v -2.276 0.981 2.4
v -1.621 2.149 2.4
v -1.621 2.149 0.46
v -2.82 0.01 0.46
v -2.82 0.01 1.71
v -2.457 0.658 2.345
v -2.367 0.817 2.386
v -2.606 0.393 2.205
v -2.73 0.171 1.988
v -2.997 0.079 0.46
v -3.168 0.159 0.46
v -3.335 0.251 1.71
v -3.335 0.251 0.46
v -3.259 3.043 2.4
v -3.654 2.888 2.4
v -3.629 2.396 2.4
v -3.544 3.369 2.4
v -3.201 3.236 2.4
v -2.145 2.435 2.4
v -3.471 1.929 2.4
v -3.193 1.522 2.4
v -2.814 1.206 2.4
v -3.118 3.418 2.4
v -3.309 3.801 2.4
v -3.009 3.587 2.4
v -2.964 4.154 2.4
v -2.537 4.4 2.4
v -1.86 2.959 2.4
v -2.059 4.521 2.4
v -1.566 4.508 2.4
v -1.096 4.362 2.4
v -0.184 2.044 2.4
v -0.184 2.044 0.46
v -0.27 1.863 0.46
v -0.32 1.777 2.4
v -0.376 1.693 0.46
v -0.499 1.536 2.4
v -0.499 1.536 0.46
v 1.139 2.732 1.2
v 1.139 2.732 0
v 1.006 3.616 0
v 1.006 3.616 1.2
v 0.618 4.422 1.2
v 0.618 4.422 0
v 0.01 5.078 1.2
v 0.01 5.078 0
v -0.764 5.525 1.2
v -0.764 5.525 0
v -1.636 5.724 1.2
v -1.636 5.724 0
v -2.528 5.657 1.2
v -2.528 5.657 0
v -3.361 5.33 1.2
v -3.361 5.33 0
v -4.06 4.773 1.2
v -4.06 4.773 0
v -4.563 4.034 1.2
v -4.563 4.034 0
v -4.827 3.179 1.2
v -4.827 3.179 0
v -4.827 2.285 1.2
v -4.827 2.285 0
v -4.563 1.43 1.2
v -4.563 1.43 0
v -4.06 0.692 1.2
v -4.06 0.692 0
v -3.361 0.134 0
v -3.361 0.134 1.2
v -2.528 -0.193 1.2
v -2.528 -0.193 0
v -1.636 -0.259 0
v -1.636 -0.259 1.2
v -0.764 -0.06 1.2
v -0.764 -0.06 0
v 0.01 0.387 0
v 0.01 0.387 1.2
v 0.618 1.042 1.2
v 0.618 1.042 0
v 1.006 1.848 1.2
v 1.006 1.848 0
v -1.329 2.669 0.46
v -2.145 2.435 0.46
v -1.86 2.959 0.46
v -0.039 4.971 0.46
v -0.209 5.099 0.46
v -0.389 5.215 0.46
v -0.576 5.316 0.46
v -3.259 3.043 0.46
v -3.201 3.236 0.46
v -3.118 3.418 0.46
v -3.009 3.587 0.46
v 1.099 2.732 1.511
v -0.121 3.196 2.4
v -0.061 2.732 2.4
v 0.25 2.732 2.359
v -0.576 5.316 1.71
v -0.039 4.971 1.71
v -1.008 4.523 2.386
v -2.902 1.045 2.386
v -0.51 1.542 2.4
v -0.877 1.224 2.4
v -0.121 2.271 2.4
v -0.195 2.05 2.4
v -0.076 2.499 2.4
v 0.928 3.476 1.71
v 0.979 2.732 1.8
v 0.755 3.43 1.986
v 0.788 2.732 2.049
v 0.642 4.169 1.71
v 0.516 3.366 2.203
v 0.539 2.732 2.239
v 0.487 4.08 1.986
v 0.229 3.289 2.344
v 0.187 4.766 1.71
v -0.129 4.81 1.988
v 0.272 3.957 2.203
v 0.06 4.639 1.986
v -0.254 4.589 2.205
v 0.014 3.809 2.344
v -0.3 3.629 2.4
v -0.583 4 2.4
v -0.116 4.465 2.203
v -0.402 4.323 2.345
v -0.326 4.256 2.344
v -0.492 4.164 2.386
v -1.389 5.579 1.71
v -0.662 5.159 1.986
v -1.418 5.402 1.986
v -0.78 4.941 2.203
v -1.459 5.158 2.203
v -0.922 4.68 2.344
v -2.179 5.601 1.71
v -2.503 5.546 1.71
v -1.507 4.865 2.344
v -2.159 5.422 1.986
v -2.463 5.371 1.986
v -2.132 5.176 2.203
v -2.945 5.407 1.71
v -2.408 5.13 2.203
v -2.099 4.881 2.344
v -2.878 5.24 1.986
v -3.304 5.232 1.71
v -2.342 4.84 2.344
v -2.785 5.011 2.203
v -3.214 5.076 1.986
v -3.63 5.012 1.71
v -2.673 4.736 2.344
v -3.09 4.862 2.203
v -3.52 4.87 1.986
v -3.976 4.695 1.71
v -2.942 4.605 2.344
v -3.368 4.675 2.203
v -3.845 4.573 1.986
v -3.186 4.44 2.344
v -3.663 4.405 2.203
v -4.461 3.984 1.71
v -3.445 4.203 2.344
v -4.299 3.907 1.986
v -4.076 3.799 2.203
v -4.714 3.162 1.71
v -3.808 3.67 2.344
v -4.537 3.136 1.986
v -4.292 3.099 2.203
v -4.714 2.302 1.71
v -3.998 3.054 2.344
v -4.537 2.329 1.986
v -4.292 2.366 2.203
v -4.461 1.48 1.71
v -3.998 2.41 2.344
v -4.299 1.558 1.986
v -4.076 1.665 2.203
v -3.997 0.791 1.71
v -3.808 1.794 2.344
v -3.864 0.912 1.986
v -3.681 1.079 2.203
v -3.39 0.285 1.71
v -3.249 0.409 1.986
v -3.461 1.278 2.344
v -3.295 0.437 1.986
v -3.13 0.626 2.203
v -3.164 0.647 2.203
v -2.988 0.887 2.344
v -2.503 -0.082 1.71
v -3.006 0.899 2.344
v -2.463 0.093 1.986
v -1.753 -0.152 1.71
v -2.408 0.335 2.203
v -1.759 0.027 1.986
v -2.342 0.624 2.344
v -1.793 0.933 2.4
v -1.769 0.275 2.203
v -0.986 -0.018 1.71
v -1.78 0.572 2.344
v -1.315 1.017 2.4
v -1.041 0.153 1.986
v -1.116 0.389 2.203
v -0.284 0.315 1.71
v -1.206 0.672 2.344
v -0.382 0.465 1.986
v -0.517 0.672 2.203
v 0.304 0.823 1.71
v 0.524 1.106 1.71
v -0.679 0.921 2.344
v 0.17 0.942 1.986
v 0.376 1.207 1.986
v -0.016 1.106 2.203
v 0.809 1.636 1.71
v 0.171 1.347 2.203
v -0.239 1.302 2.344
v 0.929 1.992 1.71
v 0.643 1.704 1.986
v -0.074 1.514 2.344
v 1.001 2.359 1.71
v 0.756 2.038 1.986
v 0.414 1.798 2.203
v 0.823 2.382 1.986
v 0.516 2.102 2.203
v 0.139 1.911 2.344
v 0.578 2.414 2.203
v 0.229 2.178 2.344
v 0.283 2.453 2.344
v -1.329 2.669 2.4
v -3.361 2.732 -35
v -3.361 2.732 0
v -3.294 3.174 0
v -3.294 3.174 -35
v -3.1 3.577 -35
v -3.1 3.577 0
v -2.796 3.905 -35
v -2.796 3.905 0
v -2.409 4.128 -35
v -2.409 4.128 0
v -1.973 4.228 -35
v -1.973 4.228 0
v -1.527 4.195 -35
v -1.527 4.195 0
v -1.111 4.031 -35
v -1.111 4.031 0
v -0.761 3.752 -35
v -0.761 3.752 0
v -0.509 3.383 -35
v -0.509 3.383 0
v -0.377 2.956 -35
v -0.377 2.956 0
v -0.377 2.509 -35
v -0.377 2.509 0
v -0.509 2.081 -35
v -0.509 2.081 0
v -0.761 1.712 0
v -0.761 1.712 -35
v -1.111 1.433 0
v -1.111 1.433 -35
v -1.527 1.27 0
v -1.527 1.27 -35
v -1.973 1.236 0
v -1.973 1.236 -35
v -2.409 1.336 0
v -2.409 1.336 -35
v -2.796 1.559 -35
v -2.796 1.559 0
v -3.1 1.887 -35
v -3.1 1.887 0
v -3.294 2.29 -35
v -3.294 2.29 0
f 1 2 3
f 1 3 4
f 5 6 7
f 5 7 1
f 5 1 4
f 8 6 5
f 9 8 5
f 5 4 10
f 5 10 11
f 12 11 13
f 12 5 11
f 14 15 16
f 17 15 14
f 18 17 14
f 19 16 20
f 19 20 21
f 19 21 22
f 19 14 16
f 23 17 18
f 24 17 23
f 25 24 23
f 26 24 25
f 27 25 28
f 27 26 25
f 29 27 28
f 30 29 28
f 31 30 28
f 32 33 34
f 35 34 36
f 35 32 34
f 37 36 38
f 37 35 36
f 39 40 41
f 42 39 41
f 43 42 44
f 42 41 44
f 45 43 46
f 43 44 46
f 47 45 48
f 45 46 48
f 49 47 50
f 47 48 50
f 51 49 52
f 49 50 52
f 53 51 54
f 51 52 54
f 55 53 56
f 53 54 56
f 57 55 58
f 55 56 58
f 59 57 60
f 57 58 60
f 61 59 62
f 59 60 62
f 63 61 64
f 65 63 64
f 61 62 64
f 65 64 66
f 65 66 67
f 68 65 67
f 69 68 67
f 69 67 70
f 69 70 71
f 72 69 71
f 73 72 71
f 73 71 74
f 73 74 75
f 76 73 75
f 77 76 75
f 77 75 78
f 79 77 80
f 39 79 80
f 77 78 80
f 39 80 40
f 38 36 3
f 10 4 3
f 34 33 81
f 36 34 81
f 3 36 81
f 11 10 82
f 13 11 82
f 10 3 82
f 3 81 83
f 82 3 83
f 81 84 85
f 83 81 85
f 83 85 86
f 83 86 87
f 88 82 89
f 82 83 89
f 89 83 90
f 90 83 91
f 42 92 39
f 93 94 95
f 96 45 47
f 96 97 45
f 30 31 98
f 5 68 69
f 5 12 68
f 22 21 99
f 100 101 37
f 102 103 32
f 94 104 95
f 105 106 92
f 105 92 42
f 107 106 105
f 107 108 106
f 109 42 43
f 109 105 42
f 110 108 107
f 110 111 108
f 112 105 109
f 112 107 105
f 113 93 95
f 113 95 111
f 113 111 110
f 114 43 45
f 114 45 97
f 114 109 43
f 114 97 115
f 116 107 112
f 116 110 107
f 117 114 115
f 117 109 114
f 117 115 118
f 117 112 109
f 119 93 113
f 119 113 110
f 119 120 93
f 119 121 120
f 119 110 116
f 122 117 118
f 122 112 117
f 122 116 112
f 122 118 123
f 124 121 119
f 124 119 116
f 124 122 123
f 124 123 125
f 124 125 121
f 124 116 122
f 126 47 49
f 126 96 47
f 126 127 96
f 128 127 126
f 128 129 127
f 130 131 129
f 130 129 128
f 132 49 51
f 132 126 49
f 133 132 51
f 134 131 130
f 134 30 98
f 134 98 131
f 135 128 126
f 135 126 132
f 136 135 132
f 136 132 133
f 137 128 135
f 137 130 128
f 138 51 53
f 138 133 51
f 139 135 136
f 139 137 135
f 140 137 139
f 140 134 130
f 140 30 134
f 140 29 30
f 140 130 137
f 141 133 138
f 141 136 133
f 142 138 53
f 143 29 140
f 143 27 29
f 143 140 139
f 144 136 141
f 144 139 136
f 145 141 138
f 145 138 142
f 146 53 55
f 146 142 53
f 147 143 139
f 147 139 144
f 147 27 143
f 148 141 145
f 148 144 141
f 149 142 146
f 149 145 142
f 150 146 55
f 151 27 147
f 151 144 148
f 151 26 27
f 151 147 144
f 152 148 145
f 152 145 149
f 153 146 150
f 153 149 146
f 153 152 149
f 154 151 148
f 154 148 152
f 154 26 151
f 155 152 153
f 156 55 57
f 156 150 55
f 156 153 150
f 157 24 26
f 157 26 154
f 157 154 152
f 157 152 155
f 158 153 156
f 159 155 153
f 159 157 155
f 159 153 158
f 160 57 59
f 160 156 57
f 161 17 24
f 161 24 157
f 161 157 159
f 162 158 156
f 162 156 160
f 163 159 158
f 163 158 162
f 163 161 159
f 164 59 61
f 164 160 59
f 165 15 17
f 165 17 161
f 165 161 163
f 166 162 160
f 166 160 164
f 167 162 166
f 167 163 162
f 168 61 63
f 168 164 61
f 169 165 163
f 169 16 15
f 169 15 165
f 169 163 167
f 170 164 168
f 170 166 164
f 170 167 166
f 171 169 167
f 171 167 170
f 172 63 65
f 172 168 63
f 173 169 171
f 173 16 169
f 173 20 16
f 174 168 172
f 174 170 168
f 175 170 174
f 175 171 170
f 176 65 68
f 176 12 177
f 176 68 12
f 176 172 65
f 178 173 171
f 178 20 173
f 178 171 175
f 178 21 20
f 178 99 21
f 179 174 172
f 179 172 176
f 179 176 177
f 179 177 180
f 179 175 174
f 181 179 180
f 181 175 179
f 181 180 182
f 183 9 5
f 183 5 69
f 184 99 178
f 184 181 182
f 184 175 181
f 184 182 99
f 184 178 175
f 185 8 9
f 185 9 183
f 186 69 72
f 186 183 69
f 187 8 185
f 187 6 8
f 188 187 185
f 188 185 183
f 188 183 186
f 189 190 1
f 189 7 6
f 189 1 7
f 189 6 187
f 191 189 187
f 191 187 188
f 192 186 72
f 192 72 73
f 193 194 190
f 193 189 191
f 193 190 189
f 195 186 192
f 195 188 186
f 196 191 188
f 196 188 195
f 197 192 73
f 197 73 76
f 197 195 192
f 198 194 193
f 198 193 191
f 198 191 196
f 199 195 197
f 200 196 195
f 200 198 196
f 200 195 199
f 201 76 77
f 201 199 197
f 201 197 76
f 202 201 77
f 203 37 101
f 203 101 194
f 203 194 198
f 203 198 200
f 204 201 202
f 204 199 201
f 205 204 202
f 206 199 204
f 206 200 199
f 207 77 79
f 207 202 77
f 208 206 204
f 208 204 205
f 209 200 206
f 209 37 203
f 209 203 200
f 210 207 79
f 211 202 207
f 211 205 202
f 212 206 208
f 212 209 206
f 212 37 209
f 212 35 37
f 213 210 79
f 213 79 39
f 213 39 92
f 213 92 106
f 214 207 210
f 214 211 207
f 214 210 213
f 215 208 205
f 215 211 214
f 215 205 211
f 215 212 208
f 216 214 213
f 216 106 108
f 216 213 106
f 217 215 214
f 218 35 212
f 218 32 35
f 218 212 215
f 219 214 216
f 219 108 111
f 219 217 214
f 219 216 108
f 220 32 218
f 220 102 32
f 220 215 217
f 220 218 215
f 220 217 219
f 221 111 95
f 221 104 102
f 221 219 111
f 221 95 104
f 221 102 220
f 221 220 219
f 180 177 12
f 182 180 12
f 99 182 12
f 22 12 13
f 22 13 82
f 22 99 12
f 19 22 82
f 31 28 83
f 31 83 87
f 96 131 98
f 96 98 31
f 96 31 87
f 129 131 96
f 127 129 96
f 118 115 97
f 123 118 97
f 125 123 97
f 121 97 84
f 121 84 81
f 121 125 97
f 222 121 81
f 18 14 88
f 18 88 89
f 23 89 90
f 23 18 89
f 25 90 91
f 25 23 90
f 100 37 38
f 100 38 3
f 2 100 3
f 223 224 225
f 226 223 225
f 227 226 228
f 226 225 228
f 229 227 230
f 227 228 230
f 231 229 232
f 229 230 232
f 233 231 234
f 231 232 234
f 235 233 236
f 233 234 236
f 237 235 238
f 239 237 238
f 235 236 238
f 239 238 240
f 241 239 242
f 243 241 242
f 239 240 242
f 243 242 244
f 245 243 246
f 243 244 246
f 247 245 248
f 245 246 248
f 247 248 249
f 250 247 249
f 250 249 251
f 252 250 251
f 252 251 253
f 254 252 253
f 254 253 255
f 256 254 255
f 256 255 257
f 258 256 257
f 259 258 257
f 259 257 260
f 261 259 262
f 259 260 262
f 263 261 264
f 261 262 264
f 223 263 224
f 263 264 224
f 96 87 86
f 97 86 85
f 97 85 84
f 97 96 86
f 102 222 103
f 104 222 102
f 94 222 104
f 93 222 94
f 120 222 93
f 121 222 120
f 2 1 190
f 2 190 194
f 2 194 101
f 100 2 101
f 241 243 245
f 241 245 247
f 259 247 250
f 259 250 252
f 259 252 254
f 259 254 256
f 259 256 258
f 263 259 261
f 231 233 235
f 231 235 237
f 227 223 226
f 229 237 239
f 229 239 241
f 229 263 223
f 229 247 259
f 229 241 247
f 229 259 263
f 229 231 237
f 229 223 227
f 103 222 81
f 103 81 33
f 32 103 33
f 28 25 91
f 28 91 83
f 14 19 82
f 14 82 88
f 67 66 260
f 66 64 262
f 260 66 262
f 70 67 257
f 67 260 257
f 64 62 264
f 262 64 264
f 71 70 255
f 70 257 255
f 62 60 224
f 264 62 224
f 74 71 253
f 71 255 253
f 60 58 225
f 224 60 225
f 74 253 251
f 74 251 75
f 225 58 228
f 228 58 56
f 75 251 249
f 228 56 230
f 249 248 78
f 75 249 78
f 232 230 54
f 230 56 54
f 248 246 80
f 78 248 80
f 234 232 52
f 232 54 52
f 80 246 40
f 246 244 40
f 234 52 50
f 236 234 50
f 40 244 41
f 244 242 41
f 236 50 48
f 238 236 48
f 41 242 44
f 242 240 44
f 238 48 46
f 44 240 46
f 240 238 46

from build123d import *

# Parameters (mm, degrees)
SZKIC1_R                    = 3
DODANIE_WYCI_GNI_CIE2_DEPTH = 2.4
SZKIC2_R                    = 1.5
DODANIE_WYCI_GNI_CIE3_DEPTH = 35
ZAOKR_GLENIE2_R             = 1.2
WYTNIJ_WYCI_GNI_CIE1_DEPTH  = 1.94


with BuildPart() as part:
    # Szkic1 → Dodanie-wyciągnięcie2 (new body)
    with BuildSketch(Plane.XY):
        with Locations((-1.860516246, 2.732142857)):
            Circle(SZKIC1_R)
    extrude(amount=DODANIE_WYCI_GNI_CIE2_DEPTH)

    # Szkic2 → Dodanie-wyciągnięcie3 (add)
    with BuildSketch(Plane(origin=(0, 0, 0), x_dir=(-1, 0, 0), z_dir=(0, 0, -1))):
        with Locations((1.860516246, 2.732142857)):
            Circle(SZKIC2_R)
    extrude(amount=DODANIE_WYCI_GNI_CIE3_DEPTH)

    # Zaokrąglenie2
    zaokr_glenie2_edges = [part.edges().sort_by_distance(p)[0] for p in [
        (-4.860516246, 2.732142857, 2.4),
    ]]
    fillet(zaokr_glenie2_edges, radius=ZAOKR_GLENIE2_R)

    # Szkic3 → Wytnij-wyciągnięcie1 (cut)
    with BuildSketch(Plane.XY.offset(2.4)):
        with BuildLine():
            Line((-1.859548318, 2.959091853), (-0.575649693, 5.316481314))
            ThreePointArc((-0.575649693, 5.316481314), (-0.297886623, 5.158637444), (-0.039271083, 4.97106076))
            Line((-0.039271083, 4.97106076), (-1.329373025, 2.669425378))
            Line((-1.329373025, 2.669425378), (-0.183967515, 2.043621837))
            ThreePointArc((-0.183967515, 2.043621837), (-0.320475658, 1.776553075), (-0.499159616, 1.535654258))
            Line((-0.499159616, 1.535654258), (-1.621312108, 2.148584891))
            Line((-1.621312108, 2.148584891), (-2.819933608, 0.01015725))
            ThreePointArc((-2.819933608, 0.01015725), (-3.083174674, 0.117799023), (-3.33454353, 0.250826496))
            Line((-3.33454353, 0.250826496), (-2.145142944, 2.434706401))
            Line((-2.145142944, 2.434706401), (-3.258687897, 3.042935511))
            ThreePointArc((-3.258687897, 3.042935511), (-3.162842423, 3.328316127), (-3.009463836, 3.587359481))
            Line((-3.009463836, 3.587359481), (-1.859548318, 2.959091853))
        make_face()
    extrude(amount=-WYTNIJ_WYCI_GNI_CIE1_DEPTH, mode=Mode.SUBTRACT)


solid = part.part
